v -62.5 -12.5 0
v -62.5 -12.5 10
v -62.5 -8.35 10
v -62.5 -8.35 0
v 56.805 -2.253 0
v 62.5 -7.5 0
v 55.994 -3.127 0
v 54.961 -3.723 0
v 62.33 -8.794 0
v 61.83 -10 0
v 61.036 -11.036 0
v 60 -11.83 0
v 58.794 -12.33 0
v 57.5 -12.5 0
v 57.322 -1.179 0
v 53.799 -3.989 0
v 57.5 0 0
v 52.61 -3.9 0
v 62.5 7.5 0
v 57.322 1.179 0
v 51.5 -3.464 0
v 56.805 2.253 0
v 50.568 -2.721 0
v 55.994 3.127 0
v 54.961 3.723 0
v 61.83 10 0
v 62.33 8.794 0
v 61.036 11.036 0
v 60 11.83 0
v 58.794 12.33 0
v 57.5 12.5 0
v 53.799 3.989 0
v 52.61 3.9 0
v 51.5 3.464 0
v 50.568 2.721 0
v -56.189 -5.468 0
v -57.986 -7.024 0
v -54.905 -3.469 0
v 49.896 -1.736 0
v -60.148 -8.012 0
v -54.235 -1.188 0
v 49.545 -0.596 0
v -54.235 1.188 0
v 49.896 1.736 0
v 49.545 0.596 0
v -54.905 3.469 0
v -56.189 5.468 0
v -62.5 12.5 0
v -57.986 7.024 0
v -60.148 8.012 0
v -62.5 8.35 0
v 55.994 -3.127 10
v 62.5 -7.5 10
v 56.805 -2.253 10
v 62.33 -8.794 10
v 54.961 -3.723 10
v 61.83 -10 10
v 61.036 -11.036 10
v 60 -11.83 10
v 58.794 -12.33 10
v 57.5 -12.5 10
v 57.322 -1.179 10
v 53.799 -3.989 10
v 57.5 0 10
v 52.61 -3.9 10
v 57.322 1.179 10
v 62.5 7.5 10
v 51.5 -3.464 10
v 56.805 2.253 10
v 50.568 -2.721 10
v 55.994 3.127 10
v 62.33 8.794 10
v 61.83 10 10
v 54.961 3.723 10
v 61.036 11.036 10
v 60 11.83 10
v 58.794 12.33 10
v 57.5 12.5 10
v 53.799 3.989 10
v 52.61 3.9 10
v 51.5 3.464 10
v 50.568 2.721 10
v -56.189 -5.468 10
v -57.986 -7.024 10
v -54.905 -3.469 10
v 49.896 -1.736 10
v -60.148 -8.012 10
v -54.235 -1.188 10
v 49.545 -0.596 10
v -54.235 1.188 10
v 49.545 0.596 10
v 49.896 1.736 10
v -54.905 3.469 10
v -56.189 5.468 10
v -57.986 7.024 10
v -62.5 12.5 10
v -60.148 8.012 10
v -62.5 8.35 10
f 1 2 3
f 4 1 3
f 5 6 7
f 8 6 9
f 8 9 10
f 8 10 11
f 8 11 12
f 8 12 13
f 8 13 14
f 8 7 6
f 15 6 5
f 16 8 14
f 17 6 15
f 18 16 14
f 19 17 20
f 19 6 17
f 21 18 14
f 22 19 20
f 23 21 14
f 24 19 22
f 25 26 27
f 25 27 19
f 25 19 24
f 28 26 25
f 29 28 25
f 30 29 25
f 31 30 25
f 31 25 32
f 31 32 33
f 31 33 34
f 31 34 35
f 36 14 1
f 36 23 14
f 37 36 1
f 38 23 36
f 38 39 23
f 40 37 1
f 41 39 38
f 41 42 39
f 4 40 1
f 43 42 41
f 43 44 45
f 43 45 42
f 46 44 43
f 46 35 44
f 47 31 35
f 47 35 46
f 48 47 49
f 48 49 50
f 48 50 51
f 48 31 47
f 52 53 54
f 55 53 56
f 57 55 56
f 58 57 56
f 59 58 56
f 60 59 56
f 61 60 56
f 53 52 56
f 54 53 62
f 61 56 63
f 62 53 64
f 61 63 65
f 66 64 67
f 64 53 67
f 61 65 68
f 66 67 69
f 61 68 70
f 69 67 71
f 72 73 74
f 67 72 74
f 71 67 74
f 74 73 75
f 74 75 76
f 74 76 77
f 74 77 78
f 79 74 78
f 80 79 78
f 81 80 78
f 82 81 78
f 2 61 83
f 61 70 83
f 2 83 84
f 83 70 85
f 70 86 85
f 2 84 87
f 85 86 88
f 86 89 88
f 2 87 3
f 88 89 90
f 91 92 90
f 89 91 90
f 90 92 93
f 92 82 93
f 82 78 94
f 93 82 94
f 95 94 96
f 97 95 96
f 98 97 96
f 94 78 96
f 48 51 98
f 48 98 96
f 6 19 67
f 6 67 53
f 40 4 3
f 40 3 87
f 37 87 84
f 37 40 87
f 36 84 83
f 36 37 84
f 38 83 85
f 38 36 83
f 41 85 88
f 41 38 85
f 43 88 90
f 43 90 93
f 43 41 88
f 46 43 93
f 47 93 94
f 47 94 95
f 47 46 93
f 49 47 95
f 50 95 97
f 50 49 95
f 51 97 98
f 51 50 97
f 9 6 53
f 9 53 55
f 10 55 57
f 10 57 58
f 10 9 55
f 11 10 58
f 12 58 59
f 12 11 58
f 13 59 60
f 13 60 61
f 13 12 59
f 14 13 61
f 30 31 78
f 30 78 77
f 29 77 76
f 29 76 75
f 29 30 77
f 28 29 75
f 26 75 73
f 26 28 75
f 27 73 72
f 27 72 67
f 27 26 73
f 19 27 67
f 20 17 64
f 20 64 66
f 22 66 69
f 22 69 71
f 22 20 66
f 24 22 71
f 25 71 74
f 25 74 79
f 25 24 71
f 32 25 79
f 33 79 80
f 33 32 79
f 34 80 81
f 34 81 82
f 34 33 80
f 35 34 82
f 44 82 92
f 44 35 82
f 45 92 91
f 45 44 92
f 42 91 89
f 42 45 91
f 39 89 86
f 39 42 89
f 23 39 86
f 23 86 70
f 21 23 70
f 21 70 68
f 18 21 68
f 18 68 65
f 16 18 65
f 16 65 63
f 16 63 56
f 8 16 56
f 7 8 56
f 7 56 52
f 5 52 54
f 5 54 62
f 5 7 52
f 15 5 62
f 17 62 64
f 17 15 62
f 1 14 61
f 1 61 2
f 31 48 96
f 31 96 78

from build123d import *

# Parameters (mm, degrees)
SKETCH1_R           = 4
BOSS_EXTRUDE1_DEPTH = 10


with BuildPart() as part:
    # Sketch1 → Boss-Extrude1 (new body)
    with BuildSketch(Plane.XY):
        with BuildLine():
            Line((-62.5, 12.5), (57.5, 12.5))
            ThreePointArc((57.5, 12.5), (61.035533906, 11.035533906), (62.5, 7.5))
            Line((62.5, 7.5), (62.5, -7.5))
            ThreePointArc((62.5, -7.5), (61.035533906, -11.035533906), (57.5, -12.5))
            Line((57.5, -12.5), (-62.5, -12.5))
            Line((-62.5, -12.5), (-62.5, -8.35))
            ThreePointArc((-62.5, -8.35), (-54.15, 0), (-62.5, 8.35))
            Line((-62.5, 8.35), (-62.5, 12.5))
        make_face()
        with Locations((53.5, 0)):
            Circle(SKETCH1_R, mode=Mode.SUBTRACT)
    extrude(amount=BOSS_EXTRUDE1_DEPTH)


solid = part.part
